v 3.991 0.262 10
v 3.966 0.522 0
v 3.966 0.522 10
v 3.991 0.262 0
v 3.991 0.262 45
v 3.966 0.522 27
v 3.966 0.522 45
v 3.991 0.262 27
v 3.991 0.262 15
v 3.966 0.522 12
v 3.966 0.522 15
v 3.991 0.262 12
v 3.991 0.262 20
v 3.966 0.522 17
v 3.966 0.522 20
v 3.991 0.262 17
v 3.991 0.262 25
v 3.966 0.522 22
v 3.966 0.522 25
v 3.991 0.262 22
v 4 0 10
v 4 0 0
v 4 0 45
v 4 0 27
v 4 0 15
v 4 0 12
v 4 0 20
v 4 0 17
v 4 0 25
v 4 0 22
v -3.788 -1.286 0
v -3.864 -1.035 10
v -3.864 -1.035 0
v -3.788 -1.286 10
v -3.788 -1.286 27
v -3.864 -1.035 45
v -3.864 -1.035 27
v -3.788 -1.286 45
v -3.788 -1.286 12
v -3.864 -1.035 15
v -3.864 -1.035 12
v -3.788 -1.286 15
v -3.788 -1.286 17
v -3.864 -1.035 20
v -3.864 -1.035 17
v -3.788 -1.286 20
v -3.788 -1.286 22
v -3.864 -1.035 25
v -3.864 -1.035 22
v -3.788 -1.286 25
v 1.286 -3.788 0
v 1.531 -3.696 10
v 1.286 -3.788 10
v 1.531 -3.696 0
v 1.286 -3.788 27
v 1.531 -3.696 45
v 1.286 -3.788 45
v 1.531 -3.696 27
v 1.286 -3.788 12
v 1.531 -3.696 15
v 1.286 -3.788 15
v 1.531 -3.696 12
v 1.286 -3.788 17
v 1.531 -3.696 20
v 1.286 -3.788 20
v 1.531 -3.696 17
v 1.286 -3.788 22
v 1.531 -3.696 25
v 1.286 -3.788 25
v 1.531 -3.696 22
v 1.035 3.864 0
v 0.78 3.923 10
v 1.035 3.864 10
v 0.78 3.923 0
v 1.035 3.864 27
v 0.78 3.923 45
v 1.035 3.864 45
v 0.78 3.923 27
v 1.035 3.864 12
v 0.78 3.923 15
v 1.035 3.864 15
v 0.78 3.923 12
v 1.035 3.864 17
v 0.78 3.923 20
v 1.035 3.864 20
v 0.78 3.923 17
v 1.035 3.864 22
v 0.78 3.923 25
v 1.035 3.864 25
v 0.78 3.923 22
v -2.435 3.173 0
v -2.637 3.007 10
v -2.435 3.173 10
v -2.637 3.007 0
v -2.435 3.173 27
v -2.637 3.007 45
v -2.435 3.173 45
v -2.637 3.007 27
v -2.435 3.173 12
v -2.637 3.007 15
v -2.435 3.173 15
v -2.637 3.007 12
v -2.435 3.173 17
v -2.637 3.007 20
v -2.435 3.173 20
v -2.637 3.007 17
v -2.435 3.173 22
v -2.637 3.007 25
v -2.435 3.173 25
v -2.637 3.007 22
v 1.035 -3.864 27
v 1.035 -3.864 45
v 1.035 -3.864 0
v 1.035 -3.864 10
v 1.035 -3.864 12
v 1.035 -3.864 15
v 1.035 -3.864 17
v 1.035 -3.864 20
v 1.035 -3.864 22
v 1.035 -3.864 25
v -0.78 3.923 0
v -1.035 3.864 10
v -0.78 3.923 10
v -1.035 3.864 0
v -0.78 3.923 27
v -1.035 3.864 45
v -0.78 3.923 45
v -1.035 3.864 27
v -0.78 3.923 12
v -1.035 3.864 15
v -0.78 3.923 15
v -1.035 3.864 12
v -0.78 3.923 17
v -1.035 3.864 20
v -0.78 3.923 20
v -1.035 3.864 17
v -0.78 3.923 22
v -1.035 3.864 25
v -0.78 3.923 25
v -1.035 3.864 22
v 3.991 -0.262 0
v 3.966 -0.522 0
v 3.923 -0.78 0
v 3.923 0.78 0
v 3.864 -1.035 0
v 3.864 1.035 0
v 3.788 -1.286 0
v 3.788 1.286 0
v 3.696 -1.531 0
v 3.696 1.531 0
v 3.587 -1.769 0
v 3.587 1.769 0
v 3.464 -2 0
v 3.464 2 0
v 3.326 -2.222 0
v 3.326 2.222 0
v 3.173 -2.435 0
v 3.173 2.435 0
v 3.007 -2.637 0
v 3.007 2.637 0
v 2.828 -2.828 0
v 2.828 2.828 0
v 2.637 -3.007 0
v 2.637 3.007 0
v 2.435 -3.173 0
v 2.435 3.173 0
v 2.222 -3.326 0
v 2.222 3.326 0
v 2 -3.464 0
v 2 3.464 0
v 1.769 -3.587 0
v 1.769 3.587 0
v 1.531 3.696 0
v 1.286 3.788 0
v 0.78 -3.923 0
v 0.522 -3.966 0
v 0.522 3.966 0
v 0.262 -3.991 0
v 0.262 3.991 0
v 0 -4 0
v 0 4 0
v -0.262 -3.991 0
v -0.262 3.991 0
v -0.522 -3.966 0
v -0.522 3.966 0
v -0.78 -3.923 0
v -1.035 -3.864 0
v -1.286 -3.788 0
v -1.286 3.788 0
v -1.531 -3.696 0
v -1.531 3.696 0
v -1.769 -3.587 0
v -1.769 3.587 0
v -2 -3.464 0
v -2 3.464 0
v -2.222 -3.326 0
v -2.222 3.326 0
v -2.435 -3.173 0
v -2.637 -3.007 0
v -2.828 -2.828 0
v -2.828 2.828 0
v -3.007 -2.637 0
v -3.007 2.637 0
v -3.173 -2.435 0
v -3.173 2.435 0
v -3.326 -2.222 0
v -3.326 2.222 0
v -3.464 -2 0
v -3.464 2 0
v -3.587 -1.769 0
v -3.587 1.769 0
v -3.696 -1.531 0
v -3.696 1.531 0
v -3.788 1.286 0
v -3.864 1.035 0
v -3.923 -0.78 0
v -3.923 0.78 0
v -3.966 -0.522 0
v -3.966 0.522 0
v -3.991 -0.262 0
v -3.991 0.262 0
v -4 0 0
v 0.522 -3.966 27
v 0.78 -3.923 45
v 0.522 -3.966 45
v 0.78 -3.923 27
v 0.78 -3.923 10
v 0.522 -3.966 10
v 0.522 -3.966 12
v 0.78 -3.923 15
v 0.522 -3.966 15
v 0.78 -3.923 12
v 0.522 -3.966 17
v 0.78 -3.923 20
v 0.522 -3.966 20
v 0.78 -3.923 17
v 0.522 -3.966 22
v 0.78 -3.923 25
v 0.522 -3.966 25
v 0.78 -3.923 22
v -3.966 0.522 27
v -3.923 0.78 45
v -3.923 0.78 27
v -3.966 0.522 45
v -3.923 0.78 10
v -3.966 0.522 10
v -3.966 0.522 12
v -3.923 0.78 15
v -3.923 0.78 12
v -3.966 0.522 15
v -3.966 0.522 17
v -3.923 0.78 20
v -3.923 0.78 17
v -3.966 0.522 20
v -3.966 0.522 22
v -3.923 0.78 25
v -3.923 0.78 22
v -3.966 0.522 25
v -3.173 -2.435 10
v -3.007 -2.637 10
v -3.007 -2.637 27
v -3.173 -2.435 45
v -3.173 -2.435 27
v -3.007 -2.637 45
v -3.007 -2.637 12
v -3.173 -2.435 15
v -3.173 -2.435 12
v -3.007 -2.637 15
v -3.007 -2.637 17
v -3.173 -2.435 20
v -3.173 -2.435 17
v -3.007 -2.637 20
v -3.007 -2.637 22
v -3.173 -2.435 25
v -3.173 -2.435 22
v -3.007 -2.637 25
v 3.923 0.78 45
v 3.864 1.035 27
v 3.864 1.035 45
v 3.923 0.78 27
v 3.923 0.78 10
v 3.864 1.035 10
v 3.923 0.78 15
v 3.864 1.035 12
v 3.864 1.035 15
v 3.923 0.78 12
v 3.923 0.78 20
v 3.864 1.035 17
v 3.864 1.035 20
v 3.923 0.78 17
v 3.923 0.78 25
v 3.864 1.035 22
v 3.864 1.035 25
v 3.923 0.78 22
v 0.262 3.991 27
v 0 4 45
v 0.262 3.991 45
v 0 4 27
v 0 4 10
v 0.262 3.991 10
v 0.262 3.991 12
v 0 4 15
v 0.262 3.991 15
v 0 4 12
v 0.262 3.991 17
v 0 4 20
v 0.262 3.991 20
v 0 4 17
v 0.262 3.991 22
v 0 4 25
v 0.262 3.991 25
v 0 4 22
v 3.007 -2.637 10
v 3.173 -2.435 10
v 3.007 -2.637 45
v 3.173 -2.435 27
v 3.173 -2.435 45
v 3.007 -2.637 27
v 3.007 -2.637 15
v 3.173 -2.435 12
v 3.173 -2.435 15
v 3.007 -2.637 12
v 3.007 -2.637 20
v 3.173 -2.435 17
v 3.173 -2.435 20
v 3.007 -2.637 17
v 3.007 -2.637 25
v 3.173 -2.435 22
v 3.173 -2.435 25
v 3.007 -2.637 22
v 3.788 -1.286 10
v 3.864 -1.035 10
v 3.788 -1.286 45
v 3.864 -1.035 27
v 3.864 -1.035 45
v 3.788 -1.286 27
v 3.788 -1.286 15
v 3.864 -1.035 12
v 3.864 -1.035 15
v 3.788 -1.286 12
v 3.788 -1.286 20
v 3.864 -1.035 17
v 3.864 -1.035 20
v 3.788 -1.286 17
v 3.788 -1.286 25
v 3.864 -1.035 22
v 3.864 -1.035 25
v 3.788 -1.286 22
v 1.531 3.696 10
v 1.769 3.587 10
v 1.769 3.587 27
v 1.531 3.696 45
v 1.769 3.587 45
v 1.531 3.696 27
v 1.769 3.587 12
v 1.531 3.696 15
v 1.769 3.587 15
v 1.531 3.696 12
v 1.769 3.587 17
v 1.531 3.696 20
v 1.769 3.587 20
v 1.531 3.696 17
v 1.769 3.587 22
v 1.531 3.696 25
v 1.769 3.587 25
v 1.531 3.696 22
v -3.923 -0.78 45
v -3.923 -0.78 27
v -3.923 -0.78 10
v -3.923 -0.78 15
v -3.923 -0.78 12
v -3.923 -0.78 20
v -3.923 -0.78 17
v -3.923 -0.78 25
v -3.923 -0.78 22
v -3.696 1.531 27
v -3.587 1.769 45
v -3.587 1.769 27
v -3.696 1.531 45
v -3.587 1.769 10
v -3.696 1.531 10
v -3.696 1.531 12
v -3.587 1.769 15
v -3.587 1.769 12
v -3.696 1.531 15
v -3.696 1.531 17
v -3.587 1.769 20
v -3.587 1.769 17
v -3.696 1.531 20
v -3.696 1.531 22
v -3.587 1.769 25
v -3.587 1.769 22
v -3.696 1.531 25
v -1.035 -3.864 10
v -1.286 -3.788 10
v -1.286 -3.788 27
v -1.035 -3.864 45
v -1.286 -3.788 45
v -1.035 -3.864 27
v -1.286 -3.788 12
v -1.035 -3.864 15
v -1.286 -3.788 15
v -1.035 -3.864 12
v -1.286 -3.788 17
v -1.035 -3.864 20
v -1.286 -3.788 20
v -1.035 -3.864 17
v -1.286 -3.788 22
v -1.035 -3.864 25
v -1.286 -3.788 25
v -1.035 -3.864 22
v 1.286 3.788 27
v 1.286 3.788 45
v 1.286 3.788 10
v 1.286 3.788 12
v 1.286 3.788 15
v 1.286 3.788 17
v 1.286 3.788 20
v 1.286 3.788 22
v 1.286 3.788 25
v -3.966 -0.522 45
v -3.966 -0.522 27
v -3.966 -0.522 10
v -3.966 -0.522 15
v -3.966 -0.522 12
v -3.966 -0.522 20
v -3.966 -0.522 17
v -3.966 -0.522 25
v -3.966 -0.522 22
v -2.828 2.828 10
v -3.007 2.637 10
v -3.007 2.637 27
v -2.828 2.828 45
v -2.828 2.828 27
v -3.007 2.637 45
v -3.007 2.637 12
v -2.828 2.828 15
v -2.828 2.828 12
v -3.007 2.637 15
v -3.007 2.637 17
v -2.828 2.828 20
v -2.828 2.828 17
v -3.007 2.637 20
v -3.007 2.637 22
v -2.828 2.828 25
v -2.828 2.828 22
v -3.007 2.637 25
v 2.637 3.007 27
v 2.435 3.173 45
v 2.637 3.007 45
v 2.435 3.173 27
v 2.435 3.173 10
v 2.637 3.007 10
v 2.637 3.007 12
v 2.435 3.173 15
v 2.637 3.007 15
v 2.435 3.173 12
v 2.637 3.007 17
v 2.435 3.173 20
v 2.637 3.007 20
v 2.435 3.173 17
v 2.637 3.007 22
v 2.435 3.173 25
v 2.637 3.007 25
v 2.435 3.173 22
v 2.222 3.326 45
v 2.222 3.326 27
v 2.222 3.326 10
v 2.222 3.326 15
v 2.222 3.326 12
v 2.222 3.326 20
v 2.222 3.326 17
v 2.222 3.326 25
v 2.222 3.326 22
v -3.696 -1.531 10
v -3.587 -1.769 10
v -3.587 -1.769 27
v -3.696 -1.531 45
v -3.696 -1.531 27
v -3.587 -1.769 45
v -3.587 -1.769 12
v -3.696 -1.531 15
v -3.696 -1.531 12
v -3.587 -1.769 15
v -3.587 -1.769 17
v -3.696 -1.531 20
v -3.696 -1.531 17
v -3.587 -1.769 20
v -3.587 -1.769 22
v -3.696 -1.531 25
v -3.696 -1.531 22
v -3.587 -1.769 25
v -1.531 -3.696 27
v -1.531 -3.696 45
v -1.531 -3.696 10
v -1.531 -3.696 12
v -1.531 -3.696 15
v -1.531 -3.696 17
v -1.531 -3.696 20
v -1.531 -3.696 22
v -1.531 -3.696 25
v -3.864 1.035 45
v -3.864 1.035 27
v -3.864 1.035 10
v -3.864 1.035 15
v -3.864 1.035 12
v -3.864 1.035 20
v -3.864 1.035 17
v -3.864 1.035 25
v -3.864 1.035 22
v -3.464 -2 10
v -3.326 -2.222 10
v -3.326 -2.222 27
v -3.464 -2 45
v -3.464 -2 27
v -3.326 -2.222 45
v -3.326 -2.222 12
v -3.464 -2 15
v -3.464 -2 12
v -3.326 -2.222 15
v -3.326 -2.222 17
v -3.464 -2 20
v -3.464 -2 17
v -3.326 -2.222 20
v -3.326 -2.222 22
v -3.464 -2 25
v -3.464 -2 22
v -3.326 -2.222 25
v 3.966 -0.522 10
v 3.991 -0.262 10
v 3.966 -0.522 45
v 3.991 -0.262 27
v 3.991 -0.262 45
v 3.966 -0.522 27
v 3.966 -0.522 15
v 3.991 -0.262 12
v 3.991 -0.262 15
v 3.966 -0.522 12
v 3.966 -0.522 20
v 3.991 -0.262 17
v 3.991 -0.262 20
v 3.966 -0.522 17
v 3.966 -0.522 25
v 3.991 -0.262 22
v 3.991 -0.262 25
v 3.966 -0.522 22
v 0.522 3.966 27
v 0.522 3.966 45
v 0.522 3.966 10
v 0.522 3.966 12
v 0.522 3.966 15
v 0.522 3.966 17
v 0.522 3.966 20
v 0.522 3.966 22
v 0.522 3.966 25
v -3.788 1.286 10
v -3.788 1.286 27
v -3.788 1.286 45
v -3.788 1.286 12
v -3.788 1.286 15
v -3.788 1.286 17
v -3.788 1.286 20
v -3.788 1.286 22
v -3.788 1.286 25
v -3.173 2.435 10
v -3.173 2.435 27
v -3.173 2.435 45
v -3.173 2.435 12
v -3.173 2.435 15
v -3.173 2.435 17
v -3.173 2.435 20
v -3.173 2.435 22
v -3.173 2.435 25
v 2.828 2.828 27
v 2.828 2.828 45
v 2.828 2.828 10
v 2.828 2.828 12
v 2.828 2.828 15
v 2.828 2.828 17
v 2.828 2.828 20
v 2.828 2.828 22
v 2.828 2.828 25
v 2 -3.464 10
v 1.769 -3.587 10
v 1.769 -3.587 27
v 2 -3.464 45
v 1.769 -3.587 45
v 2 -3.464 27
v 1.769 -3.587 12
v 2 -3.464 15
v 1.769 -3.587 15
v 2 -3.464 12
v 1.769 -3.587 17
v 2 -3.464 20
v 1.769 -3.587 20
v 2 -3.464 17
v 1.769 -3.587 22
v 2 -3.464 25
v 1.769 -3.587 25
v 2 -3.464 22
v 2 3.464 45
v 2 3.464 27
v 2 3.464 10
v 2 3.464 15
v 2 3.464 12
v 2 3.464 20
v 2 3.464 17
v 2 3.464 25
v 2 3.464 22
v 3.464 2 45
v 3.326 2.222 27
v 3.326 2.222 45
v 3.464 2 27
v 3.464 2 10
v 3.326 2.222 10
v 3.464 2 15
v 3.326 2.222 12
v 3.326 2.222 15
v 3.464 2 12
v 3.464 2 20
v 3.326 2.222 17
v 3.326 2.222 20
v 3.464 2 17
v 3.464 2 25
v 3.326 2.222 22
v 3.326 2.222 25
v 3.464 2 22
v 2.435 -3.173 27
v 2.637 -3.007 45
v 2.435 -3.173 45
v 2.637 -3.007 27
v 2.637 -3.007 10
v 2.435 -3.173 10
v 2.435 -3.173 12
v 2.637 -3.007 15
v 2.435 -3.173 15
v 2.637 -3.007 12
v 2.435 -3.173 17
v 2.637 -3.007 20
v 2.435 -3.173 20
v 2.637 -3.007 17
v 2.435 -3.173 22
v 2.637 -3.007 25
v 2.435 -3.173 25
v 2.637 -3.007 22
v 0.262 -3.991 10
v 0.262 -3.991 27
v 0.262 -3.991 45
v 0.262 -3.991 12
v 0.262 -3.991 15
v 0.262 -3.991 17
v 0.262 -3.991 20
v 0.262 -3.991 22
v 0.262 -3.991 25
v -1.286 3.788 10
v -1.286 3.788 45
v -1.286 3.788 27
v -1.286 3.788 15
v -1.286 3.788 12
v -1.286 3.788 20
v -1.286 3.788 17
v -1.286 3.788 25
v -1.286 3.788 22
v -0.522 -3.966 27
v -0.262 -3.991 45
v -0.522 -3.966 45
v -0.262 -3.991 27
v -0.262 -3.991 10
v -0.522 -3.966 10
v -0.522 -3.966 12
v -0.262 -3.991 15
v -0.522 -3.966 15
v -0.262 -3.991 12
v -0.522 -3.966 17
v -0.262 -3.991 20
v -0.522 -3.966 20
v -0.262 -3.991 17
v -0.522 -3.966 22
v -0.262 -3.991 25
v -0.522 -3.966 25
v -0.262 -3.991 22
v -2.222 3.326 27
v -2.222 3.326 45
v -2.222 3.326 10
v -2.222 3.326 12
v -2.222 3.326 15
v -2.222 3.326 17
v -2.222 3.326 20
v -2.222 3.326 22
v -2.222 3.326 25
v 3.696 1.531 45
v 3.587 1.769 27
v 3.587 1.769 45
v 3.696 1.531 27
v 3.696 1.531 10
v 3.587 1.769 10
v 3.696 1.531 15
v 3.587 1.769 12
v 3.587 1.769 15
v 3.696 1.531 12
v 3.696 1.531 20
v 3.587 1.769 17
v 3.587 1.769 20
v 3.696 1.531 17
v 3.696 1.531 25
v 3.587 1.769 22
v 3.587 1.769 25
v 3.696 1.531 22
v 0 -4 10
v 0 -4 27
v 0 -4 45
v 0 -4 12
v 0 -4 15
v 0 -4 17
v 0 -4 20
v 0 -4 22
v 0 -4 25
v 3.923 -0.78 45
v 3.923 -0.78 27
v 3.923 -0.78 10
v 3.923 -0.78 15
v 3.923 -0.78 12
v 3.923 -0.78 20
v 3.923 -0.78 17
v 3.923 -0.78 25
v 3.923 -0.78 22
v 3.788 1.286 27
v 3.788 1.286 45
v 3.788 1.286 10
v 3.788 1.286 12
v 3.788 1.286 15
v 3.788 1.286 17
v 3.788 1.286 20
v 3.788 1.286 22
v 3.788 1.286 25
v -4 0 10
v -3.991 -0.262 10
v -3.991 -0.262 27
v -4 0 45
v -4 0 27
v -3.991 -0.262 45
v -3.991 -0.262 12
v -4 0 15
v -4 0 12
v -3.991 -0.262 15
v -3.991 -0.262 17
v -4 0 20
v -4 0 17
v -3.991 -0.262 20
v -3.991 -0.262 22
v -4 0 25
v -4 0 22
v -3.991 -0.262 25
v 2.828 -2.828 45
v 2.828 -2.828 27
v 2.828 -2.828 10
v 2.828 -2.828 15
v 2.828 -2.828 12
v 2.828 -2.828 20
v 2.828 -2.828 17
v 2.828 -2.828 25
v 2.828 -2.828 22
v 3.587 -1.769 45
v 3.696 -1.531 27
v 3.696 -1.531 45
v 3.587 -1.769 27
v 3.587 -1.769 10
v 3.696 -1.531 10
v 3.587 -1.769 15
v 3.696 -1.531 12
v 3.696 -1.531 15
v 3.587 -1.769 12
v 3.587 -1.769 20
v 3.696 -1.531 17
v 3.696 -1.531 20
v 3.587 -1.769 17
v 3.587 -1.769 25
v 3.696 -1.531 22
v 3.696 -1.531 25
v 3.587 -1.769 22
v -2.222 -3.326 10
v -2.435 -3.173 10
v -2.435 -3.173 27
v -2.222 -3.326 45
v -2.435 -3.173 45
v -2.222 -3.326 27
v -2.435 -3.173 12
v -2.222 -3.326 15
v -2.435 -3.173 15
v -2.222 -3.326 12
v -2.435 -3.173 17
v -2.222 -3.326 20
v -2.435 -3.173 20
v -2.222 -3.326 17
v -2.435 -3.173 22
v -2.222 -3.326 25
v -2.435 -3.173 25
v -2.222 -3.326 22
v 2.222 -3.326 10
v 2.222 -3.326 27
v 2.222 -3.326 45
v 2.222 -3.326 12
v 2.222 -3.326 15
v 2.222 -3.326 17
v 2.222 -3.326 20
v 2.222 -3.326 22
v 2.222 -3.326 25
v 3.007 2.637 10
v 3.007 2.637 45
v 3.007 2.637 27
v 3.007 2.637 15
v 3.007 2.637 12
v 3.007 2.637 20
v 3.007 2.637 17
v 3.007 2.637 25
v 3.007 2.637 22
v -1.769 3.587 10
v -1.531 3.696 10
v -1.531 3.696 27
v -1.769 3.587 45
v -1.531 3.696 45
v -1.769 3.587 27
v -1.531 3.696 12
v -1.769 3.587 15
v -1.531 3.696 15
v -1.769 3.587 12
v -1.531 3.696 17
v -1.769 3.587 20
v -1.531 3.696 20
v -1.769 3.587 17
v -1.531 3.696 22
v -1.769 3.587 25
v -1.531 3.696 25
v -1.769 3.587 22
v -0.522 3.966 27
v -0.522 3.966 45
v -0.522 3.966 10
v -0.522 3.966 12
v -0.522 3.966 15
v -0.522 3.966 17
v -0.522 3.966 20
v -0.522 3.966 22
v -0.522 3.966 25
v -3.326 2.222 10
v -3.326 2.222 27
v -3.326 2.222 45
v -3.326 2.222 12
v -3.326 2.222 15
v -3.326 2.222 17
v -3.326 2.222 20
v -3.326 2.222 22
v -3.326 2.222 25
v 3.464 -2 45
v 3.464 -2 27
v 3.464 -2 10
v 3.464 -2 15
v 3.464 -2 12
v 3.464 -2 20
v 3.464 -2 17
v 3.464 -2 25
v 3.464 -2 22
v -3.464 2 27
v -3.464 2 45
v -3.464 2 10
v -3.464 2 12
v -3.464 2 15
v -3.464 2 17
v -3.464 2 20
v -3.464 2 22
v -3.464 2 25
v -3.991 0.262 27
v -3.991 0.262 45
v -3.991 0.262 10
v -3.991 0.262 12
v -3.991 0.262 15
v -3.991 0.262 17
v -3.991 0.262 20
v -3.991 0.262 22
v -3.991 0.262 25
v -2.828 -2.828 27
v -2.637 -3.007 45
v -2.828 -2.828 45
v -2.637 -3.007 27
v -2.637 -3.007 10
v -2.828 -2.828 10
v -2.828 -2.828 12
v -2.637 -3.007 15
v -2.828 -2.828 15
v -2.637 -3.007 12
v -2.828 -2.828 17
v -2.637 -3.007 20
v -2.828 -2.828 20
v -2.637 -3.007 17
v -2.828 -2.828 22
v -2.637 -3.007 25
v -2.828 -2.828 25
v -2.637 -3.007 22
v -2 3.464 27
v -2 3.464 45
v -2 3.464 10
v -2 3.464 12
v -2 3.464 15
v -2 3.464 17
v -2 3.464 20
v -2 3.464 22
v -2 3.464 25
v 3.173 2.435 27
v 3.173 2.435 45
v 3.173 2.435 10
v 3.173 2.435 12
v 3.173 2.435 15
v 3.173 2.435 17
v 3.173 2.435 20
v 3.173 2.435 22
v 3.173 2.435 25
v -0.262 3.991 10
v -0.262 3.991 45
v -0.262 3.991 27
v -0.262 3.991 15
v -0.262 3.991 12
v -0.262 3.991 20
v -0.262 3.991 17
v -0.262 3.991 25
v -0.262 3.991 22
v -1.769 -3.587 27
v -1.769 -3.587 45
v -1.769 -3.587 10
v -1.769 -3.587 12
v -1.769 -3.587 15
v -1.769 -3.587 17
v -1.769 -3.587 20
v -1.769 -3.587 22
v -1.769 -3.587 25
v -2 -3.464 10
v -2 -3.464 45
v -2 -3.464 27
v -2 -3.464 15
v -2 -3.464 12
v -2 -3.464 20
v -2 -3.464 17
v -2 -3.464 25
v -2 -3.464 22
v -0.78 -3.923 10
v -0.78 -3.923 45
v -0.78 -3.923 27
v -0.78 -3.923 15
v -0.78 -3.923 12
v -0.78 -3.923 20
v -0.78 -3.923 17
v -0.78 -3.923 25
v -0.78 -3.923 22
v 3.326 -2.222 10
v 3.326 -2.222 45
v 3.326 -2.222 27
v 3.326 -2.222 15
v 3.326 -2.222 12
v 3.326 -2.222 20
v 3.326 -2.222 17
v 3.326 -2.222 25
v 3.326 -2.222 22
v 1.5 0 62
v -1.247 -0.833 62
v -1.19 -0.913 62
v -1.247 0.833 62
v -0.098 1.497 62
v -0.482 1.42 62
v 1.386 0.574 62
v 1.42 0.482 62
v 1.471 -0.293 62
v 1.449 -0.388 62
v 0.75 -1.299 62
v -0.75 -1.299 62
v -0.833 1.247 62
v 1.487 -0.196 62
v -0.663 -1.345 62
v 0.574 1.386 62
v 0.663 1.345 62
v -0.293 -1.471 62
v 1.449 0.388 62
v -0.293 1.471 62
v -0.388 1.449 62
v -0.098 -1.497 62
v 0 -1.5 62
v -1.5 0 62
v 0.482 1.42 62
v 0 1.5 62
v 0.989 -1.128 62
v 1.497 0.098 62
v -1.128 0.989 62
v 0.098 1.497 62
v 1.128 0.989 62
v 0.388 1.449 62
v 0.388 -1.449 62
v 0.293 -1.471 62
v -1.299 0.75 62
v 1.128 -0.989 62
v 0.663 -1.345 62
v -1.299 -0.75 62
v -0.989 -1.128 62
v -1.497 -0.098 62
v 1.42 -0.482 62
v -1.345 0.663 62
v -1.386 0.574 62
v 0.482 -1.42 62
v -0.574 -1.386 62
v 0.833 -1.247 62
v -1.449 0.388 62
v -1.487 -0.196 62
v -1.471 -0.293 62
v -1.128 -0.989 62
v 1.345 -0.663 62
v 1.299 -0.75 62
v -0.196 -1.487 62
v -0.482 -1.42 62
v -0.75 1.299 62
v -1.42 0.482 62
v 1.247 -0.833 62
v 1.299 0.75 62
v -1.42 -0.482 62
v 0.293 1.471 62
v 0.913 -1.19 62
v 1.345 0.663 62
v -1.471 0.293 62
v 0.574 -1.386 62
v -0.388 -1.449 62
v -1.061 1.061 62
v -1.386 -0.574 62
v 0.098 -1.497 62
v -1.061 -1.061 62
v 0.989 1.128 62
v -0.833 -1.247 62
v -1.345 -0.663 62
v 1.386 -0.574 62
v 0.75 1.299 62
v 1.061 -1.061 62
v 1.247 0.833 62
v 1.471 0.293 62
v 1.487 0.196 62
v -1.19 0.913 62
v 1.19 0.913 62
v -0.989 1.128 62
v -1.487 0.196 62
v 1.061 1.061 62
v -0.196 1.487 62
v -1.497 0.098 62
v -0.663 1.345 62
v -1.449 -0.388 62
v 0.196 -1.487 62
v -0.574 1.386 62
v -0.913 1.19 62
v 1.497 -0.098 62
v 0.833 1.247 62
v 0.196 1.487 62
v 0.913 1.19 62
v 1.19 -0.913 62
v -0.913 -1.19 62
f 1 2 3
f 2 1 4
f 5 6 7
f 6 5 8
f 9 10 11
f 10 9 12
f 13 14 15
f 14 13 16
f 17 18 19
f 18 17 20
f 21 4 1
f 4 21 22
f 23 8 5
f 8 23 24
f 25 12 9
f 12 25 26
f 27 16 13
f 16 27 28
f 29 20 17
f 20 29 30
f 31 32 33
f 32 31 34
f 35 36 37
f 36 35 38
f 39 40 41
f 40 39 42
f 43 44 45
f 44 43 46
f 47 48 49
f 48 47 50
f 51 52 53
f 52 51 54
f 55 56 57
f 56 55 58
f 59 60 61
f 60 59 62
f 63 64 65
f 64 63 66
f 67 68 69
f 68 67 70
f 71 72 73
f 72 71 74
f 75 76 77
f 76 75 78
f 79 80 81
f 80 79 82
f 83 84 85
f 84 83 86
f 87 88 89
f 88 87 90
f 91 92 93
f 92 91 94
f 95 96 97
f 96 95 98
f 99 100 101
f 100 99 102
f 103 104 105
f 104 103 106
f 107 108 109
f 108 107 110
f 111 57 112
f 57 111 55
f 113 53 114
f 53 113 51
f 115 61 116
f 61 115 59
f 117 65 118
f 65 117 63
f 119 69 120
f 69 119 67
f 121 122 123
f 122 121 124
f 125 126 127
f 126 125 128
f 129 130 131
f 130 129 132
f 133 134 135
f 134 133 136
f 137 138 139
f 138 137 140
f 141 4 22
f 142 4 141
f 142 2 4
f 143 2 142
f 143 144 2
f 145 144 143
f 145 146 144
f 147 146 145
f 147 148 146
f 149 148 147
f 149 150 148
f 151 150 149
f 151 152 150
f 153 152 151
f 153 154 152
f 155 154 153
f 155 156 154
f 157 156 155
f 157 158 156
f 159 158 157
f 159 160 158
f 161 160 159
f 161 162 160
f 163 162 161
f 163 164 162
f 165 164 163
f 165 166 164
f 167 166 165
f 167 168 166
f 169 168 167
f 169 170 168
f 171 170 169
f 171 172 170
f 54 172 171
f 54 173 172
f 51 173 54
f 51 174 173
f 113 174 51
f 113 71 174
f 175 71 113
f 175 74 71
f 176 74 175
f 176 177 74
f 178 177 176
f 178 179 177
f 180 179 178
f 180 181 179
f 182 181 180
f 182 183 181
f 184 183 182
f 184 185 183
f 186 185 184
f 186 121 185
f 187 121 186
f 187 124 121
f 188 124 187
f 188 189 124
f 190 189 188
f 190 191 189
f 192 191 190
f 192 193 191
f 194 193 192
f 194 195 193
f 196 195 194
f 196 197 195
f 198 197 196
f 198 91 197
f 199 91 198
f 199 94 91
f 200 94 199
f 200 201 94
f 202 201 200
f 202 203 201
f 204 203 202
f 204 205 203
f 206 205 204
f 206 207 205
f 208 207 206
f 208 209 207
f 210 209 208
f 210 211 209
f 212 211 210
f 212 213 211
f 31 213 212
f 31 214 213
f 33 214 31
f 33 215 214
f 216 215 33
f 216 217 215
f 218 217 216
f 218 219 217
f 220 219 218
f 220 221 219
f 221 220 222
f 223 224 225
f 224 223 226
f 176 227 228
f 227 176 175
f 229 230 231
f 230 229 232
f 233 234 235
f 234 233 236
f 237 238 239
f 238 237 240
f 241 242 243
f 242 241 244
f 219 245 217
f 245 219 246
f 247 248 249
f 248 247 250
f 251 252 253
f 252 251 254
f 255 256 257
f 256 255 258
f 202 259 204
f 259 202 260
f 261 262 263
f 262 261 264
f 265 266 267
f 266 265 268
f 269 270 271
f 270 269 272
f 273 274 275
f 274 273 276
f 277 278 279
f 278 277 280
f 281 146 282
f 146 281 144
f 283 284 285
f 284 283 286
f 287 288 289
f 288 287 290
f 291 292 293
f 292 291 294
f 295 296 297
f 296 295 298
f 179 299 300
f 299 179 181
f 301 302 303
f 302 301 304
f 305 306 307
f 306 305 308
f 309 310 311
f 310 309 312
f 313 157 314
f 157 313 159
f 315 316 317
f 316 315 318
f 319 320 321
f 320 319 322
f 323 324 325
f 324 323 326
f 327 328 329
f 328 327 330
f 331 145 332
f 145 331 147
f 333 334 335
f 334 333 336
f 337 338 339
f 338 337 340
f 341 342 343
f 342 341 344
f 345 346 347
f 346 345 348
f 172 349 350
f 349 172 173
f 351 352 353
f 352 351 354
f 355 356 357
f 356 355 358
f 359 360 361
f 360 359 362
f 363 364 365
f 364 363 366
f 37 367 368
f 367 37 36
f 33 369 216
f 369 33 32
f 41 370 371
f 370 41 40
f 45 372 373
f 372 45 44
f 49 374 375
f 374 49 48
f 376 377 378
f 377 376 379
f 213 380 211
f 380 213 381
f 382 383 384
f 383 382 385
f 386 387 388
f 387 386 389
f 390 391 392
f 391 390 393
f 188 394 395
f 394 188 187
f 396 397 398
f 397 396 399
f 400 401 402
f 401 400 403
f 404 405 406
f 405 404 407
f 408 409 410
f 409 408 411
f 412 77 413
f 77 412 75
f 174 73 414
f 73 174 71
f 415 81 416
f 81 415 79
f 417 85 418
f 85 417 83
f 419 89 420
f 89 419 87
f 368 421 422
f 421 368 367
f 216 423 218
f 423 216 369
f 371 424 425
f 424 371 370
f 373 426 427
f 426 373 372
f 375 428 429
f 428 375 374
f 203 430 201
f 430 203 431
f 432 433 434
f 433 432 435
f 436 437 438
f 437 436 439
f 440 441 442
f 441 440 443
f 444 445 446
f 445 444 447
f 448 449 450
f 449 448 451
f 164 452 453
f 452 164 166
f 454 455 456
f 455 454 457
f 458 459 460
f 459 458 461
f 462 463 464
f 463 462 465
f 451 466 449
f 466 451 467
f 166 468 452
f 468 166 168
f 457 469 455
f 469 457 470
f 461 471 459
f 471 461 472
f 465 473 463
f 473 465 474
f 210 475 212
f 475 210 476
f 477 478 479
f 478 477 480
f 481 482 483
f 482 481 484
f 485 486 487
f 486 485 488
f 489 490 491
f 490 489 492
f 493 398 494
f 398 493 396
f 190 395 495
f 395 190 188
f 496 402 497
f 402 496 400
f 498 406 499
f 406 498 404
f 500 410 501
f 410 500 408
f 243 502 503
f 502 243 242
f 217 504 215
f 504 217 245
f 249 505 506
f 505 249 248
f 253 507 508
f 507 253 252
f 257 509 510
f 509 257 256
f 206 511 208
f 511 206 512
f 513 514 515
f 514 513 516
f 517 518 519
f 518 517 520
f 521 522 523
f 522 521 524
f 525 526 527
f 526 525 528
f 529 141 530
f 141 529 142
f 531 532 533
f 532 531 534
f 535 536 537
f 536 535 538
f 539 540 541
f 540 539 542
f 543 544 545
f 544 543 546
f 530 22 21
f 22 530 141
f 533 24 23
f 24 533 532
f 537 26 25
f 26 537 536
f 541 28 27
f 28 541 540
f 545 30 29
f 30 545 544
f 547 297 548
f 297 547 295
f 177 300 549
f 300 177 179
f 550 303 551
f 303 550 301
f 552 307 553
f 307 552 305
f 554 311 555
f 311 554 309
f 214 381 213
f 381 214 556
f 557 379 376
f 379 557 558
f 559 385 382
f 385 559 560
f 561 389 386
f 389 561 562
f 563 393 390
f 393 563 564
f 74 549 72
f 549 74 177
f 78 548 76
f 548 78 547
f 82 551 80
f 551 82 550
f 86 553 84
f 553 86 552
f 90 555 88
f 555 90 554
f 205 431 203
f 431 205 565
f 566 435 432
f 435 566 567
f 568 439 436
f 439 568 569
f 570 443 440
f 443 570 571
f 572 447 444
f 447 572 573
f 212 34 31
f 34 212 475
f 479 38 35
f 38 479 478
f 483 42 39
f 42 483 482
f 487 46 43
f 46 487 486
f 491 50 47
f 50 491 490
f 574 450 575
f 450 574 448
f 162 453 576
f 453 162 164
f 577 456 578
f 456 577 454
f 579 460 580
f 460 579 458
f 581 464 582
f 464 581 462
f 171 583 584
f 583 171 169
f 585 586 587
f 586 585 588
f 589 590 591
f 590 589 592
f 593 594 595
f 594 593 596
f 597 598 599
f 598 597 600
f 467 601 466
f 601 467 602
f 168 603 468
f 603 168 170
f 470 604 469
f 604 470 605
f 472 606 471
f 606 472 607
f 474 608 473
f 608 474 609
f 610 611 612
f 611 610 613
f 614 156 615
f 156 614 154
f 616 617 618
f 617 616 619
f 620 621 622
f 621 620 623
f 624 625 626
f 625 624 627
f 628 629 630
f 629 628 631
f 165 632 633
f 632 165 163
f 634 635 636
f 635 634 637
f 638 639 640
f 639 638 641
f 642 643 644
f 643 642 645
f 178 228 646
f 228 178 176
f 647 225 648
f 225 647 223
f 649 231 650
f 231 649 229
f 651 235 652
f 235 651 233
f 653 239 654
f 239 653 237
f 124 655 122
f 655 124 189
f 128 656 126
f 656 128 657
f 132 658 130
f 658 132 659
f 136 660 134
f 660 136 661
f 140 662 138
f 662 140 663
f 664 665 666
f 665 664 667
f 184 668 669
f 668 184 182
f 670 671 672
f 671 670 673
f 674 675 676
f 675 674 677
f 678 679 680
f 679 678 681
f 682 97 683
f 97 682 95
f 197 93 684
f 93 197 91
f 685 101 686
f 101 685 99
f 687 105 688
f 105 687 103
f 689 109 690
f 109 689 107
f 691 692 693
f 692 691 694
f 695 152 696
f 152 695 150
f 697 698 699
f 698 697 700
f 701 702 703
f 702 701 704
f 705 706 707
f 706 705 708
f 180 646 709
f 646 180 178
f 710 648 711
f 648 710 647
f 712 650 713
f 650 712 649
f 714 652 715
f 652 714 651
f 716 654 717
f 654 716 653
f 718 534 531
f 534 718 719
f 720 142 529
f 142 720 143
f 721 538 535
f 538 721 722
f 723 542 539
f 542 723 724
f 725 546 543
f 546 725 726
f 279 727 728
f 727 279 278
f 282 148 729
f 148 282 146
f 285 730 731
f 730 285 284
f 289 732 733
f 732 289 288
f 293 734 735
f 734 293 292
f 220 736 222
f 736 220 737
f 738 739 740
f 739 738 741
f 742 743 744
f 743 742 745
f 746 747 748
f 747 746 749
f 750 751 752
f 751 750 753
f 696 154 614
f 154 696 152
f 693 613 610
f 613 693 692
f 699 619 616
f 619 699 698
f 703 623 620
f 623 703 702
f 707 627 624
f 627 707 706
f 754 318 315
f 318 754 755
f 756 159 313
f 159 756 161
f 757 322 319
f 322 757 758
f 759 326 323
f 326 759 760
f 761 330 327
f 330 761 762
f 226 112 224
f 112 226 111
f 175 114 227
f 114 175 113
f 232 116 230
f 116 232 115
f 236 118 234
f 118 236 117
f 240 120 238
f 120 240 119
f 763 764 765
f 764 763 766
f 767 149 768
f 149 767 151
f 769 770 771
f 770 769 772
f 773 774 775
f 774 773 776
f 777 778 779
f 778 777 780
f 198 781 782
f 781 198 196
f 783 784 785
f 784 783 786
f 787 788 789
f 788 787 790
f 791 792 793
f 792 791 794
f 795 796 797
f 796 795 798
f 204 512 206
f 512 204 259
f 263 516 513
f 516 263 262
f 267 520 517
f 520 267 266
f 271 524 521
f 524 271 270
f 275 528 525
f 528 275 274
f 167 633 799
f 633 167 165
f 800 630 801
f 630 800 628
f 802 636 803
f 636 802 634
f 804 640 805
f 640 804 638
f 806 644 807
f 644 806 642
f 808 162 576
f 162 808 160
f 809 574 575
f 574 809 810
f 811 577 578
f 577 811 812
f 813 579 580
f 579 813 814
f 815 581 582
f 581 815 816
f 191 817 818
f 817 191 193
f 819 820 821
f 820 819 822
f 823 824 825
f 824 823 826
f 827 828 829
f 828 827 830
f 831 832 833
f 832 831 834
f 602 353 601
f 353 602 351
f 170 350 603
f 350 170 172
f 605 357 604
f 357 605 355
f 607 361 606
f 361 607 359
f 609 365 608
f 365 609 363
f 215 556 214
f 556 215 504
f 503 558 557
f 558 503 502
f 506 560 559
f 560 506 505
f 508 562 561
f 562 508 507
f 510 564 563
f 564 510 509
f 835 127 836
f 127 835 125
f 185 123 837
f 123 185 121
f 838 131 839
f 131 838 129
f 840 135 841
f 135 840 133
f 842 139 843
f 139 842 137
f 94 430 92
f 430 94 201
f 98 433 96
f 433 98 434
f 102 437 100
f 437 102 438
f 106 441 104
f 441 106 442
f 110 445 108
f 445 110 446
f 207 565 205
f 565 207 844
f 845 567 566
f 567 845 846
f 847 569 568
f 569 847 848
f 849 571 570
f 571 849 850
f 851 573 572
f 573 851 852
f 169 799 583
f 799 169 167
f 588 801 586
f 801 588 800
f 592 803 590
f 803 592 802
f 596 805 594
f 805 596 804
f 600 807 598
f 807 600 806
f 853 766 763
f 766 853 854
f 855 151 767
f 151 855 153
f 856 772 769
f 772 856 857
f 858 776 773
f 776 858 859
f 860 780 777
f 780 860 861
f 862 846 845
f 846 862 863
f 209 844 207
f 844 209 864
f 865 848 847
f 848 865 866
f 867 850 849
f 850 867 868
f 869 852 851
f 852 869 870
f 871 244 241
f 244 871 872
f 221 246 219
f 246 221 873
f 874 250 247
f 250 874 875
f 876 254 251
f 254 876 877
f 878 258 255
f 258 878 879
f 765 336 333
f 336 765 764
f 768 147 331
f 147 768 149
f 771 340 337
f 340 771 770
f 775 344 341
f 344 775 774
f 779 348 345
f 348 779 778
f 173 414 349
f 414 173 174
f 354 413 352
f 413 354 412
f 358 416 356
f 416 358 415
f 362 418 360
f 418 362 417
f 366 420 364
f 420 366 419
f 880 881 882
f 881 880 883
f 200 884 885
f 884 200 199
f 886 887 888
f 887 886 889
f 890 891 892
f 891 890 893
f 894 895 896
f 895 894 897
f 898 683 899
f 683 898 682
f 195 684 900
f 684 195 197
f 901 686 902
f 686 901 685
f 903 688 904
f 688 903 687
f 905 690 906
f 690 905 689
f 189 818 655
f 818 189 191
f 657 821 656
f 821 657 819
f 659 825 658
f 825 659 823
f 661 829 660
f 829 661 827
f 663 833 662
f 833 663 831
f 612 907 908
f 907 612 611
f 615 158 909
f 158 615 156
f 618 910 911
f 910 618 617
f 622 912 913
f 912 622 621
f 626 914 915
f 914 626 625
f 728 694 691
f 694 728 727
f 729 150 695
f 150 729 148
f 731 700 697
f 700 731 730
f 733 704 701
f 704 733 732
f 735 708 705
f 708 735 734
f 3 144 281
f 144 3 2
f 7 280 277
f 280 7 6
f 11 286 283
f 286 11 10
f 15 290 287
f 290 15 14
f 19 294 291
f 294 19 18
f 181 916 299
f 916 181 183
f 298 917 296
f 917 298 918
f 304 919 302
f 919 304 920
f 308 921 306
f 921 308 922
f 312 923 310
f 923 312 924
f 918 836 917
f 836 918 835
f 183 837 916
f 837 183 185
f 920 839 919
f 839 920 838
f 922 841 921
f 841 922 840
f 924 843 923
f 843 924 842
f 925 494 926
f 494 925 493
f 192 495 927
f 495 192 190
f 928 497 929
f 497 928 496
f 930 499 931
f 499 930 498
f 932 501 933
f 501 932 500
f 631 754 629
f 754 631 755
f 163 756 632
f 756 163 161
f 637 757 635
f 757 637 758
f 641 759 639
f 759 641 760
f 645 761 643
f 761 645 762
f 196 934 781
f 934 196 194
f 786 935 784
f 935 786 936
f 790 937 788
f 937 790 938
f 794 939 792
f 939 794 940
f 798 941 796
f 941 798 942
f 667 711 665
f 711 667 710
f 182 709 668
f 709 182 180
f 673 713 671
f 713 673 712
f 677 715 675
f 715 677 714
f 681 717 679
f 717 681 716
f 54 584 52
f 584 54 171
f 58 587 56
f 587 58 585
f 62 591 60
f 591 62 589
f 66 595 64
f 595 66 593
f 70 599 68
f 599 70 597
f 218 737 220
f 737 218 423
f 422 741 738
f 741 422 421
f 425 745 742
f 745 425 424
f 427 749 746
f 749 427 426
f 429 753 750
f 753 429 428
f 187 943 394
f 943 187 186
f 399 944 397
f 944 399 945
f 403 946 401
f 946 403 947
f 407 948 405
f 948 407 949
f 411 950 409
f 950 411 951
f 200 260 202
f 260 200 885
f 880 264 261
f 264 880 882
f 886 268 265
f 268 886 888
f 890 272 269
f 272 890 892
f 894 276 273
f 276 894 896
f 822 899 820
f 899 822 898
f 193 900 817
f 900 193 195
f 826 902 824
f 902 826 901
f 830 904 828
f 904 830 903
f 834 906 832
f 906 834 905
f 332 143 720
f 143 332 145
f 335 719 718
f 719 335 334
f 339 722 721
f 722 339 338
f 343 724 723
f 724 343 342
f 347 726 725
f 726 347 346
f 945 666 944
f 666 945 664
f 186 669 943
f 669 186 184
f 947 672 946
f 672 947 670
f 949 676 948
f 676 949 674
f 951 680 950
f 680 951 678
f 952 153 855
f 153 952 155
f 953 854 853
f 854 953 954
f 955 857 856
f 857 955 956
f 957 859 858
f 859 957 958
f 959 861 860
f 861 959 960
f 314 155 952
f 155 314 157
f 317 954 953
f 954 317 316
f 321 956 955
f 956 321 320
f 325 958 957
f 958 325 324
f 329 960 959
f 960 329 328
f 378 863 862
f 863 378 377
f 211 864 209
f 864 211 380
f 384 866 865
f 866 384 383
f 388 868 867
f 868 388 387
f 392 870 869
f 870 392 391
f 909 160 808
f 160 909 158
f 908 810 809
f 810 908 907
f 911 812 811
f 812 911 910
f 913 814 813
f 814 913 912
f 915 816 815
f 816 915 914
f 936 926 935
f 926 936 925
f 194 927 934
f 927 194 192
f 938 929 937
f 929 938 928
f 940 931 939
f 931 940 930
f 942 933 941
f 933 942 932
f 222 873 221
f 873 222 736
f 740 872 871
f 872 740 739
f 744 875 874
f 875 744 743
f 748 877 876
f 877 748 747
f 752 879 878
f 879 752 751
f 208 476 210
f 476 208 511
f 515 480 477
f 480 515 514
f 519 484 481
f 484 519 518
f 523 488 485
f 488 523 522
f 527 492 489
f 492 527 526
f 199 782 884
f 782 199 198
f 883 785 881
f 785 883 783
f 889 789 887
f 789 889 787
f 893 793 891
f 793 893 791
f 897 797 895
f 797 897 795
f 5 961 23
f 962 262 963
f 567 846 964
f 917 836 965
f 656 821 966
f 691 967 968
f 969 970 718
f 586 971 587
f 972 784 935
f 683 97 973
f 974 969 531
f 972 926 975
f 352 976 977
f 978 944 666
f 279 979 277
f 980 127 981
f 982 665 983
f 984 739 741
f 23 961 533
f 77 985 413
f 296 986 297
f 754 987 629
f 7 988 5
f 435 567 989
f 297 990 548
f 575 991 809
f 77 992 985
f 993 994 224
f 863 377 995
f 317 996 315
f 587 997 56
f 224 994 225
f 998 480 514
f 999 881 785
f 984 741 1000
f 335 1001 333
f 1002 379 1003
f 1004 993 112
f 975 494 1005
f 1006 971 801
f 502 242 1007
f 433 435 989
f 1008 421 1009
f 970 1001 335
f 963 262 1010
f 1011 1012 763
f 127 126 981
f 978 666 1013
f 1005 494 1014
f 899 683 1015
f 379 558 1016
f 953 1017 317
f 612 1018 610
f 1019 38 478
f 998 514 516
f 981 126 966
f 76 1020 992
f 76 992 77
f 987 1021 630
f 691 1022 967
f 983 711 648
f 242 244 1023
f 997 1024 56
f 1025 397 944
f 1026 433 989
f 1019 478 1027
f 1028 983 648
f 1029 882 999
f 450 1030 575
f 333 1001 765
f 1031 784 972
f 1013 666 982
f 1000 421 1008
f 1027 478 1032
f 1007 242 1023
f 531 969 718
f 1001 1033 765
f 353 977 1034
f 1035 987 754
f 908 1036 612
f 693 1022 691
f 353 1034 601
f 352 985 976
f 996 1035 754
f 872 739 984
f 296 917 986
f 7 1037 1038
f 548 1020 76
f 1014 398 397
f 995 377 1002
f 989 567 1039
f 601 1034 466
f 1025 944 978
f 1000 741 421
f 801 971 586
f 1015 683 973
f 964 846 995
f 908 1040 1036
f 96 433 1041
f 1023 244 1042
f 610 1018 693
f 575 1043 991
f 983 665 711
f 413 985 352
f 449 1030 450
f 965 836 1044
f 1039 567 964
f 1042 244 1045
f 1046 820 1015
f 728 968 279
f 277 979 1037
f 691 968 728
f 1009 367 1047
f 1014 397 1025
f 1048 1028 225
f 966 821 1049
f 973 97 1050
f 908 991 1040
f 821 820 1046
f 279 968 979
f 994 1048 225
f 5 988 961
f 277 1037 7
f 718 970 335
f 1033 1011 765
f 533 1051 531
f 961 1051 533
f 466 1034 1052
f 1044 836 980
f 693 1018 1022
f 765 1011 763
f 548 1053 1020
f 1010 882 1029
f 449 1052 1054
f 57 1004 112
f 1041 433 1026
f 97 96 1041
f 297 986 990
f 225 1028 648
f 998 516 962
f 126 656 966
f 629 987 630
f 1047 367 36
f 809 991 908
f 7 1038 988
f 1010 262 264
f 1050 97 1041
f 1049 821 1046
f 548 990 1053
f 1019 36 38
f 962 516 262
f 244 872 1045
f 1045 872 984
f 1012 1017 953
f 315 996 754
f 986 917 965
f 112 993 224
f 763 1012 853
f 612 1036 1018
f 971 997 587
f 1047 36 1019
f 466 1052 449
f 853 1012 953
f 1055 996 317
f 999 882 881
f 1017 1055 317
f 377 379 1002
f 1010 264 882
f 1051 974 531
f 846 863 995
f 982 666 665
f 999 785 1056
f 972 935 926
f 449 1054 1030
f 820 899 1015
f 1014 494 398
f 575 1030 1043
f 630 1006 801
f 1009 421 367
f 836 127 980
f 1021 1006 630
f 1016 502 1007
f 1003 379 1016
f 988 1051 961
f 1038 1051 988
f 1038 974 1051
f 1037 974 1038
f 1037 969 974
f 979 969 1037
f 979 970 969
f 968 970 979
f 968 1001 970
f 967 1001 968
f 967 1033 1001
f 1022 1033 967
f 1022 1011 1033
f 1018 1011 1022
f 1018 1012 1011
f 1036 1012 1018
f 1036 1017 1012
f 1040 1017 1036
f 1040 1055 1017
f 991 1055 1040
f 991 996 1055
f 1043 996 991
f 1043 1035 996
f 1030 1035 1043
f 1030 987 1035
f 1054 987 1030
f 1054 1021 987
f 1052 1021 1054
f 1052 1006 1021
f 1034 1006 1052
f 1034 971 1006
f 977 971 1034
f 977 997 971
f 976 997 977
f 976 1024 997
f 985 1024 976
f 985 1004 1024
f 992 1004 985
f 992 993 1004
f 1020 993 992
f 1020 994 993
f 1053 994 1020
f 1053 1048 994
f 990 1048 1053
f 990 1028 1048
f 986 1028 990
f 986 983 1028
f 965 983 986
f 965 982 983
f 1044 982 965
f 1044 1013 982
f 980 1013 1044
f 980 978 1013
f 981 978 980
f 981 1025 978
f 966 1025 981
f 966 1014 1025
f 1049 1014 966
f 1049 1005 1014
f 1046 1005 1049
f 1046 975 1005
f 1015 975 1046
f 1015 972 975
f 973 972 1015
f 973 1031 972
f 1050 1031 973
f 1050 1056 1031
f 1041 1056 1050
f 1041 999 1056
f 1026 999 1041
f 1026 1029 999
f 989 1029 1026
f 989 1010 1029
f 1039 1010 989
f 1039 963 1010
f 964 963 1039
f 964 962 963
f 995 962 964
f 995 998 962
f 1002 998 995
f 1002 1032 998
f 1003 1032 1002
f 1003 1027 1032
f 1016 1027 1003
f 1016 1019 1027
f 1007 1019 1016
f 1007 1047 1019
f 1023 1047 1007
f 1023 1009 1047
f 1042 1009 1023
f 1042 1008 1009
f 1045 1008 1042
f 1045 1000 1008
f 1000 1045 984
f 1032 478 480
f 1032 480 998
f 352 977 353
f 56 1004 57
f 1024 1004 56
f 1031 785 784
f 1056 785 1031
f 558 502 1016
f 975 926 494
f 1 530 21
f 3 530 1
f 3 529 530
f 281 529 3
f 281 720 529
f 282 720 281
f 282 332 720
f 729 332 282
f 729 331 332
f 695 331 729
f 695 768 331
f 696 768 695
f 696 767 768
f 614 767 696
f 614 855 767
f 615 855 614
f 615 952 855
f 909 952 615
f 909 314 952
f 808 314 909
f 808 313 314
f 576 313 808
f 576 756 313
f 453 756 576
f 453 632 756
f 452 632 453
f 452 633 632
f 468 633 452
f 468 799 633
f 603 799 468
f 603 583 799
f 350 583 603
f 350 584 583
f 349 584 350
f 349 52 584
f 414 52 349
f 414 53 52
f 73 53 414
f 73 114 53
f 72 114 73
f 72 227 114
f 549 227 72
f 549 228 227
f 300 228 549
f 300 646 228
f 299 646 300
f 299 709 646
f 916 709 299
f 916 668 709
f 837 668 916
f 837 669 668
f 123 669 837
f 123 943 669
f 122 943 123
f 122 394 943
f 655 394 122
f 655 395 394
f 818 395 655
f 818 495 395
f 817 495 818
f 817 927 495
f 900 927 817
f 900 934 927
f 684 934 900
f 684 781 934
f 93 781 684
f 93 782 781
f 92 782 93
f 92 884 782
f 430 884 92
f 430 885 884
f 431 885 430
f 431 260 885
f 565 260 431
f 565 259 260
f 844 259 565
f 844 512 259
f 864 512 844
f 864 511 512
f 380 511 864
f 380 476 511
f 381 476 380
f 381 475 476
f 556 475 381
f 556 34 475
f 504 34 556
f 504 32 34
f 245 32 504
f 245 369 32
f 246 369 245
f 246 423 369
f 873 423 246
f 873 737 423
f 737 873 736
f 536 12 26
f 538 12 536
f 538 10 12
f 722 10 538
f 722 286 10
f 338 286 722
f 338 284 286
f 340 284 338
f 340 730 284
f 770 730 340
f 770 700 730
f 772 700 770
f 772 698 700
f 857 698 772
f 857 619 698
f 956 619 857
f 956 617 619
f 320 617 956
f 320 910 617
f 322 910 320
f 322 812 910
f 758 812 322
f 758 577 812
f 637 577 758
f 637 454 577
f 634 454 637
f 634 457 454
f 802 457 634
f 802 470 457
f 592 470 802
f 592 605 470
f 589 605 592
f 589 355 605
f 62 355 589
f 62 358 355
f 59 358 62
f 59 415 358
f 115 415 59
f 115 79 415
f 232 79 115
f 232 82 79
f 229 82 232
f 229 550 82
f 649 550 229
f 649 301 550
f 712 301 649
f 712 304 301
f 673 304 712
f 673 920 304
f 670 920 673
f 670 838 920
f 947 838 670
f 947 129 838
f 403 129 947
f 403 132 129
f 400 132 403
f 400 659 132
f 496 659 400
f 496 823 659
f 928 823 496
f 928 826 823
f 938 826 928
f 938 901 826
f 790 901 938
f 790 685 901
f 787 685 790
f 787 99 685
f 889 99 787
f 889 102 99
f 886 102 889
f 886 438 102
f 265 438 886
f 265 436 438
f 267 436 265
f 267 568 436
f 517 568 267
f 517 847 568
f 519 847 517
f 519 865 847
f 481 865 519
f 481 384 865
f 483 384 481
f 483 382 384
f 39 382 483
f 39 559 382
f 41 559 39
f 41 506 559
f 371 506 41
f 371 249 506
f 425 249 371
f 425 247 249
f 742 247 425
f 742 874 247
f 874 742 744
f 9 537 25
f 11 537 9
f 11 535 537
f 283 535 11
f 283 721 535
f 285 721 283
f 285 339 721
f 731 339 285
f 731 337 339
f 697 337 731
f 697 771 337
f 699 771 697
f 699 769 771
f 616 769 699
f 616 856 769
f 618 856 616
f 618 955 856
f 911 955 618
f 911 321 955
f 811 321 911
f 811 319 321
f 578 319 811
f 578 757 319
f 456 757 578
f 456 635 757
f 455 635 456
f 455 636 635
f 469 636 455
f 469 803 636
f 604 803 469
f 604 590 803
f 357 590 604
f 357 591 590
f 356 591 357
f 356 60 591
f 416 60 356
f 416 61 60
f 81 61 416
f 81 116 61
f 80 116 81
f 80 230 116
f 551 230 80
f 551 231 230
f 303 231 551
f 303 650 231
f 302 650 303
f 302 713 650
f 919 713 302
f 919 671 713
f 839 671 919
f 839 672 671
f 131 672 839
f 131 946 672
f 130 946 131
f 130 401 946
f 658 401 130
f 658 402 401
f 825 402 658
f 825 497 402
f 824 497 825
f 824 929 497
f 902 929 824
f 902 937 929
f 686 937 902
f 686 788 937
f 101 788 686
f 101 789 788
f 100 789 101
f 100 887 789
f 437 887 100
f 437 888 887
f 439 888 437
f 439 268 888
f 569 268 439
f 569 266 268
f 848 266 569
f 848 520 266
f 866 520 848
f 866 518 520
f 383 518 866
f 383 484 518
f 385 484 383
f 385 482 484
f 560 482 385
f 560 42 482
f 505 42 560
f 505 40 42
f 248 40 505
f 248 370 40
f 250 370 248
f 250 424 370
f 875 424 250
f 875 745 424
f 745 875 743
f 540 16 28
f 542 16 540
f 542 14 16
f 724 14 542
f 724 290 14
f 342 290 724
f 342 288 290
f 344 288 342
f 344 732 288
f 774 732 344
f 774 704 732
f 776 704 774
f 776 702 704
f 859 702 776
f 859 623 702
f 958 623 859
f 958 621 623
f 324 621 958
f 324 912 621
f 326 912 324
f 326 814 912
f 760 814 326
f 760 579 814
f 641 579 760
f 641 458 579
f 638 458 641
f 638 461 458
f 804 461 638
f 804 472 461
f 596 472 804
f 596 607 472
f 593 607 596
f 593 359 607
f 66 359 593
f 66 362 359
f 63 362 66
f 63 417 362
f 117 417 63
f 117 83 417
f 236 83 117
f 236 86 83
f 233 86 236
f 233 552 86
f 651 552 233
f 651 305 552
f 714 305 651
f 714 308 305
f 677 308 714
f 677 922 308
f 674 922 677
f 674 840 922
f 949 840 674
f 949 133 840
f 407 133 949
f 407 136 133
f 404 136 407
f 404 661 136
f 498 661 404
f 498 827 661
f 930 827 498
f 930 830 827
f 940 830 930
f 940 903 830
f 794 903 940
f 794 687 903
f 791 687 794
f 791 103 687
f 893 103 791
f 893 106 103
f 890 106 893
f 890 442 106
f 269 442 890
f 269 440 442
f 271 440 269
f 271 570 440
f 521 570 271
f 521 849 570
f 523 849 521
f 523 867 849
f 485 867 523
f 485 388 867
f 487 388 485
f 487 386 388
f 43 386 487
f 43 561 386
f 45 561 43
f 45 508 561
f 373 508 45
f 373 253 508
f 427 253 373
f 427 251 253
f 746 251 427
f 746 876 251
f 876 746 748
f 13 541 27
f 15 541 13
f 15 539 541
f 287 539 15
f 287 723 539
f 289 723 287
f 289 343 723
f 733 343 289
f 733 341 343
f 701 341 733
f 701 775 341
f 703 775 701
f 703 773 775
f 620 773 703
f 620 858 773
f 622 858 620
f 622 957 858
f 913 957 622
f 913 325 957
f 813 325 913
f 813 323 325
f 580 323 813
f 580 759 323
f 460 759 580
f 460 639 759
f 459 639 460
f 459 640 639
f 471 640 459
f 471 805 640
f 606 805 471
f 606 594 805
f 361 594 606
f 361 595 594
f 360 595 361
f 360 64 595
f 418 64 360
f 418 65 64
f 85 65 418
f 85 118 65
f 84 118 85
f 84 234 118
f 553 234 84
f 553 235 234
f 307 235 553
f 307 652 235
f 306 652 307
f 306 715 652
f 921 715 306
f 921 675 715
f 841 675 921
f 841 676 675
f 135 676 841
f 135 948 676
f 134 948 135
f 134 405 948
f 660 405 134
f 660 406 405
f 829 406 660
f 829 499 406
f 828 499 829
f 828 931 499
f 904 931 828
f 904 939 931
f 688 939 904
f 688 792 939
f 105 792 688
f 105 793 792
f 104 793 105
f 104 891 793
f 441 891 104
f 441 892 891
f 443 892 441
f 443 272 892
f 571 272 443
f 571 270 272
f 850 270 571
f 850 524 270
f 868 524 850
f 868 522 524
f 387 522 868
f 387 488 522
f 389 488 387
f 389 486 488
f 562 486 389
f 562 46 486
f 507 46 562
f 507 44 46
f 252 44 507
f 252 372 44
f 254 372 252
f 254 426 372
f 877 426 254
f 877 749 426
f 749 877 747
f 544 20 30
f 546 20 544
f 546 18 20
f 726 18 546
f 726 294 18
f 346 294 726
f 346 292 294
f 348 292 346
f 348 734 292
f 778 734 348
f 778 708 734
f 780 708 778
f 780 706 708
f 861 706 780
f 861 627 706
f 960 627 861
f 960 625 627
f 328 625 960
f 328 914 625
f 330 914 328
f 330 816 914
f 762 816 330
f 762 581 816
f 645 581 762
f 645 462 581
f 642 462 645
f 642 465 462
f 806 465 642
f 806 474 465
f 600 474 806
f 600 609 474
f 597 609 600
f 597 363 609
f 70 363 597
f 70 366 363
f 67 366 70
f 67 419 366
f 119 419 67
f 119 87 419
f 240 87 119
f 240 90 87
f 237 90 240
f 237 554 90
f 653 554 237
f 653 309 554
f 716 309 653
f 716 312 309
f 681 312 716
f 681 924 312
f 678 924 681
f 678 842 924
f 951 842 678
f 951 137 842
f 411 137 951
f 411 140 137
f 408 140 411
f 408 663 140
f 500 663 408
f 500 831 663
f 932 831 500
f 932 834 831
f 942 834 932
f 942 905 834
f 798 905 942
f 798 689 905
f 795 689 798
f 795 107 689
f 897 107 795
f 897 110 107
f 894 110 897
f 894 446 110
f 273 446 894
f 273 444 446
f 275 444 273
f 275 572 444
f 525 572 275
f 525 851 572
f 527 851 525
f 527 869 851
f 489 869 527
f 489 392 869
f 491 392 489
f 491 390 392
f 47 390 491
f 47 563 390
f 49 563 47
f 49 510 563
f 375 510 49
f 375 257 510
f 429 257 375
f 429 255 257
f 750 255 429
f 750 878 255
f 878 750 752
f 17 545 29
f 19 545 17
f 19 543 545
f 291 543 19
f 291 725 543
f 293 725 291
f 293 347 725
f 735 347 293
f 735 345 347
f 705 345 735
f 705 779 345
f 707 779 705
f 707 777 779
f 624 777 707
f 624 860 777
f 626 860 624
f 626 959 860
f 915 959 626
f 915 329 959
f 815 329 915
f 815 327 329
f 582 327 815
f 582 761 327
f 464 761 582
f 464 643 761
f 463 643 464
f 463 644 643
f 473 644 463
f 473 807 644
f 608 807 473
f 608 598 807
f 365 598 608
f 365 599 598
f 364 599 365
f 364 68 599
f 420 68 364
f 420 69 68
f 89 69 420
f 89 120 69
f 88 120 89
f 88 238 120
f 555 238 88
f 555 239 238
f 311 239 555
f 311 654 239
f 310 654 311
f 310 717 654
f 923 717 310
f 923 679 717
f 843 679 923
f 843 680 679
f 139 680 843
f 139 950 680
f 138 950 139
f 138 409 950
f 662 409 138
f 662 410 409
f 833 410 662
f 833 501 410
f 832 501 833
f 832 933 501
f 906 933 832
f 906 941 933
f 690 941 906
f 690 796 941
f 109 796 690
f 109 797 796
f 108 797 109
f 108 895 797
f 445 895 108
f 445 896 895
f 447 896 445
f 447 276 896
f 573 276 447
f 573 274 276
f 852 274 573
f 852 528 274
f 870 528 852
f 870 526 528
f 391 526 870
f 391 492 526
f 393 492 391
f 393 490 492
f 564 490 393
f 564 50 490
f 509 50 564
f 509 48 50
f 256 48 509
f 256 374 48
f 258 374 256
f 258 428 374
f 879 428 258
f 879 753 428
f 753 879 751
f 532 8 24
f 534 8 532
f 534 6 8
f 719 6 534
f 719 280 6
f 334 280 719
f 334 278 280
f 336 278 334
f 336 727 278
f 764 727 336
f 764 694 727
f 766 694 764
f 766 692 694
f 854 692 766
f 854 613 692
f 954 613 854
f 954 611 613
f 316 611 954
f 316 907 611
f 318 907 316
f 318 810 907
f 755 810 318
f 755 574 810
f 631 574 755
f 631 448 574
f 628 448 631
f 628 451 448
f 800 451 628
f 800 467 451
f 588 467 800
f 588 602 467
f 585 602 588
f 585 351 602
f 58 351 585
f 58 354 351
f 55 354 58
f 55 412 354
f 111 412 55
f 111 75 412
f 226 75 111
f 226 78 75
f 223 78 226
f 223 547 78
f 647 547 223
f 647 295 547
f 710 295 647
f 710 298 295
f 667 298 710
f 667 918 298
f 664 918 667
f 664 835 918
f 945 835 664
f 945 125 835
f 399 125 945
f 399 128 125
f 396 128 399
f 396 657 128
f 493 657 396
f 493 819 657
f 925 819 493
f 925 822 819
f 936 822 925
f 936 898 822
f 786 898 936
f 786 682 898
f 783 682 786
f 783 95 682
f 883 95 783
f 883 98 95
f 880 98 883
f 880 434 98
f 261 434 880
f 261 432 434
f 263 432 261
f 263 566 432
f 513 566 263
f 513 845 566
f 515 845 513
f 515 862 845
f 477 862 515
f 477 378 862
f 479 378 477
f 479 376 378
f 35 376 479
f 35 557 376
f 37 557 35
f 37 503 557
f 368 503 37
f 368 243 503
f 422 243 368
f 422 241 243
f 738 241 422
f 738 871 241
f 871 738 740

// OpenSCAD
// Pestle for grinding tissue inside a 1.5 mL microcentrifuge tube
// Printed upright: handle at the bottom, tip pointing up.

$fn = 96;

// ---- Dimensions (mm) ----
handle_d      = 8;    // handle diameter
handle_top_z  = 45;   // handle height / cone start
tip_min_d     = 3;    // cone tip diameter / sphere diameter
tip_centre_z  = 62;   // sphere centre height
groove_count  = 4;    // number of circumferential grooves
groove_w      = 2;    // groove width (Z)
groove_d      = 1;    // groove depth from outer surface
groove_zs     = [10, 15, 20, 25]; // groove centre heights

eps           = 0.5;  // cutter overshoot

difference() {
    union() {
        // Handle
        cylinder(d = handle_d, h = handle_top_z);
        // Cone
        translate([0, 0, handle_top_z])
            cylinder(d1 = handle_d, d2 = tip_min_d, h = tip_centre_z - handle_top_z);
        // Rounded tip
        translate([0, 0, tip_centre_z - 1.5])
            sphere(d = tip_min_d);
    }

    // Grip grooves
    for (z = groove_zs)
        translate([0, 0, z])
            cylinder(d = handle_d + 2 * groove_d, h = groove_w);
}
